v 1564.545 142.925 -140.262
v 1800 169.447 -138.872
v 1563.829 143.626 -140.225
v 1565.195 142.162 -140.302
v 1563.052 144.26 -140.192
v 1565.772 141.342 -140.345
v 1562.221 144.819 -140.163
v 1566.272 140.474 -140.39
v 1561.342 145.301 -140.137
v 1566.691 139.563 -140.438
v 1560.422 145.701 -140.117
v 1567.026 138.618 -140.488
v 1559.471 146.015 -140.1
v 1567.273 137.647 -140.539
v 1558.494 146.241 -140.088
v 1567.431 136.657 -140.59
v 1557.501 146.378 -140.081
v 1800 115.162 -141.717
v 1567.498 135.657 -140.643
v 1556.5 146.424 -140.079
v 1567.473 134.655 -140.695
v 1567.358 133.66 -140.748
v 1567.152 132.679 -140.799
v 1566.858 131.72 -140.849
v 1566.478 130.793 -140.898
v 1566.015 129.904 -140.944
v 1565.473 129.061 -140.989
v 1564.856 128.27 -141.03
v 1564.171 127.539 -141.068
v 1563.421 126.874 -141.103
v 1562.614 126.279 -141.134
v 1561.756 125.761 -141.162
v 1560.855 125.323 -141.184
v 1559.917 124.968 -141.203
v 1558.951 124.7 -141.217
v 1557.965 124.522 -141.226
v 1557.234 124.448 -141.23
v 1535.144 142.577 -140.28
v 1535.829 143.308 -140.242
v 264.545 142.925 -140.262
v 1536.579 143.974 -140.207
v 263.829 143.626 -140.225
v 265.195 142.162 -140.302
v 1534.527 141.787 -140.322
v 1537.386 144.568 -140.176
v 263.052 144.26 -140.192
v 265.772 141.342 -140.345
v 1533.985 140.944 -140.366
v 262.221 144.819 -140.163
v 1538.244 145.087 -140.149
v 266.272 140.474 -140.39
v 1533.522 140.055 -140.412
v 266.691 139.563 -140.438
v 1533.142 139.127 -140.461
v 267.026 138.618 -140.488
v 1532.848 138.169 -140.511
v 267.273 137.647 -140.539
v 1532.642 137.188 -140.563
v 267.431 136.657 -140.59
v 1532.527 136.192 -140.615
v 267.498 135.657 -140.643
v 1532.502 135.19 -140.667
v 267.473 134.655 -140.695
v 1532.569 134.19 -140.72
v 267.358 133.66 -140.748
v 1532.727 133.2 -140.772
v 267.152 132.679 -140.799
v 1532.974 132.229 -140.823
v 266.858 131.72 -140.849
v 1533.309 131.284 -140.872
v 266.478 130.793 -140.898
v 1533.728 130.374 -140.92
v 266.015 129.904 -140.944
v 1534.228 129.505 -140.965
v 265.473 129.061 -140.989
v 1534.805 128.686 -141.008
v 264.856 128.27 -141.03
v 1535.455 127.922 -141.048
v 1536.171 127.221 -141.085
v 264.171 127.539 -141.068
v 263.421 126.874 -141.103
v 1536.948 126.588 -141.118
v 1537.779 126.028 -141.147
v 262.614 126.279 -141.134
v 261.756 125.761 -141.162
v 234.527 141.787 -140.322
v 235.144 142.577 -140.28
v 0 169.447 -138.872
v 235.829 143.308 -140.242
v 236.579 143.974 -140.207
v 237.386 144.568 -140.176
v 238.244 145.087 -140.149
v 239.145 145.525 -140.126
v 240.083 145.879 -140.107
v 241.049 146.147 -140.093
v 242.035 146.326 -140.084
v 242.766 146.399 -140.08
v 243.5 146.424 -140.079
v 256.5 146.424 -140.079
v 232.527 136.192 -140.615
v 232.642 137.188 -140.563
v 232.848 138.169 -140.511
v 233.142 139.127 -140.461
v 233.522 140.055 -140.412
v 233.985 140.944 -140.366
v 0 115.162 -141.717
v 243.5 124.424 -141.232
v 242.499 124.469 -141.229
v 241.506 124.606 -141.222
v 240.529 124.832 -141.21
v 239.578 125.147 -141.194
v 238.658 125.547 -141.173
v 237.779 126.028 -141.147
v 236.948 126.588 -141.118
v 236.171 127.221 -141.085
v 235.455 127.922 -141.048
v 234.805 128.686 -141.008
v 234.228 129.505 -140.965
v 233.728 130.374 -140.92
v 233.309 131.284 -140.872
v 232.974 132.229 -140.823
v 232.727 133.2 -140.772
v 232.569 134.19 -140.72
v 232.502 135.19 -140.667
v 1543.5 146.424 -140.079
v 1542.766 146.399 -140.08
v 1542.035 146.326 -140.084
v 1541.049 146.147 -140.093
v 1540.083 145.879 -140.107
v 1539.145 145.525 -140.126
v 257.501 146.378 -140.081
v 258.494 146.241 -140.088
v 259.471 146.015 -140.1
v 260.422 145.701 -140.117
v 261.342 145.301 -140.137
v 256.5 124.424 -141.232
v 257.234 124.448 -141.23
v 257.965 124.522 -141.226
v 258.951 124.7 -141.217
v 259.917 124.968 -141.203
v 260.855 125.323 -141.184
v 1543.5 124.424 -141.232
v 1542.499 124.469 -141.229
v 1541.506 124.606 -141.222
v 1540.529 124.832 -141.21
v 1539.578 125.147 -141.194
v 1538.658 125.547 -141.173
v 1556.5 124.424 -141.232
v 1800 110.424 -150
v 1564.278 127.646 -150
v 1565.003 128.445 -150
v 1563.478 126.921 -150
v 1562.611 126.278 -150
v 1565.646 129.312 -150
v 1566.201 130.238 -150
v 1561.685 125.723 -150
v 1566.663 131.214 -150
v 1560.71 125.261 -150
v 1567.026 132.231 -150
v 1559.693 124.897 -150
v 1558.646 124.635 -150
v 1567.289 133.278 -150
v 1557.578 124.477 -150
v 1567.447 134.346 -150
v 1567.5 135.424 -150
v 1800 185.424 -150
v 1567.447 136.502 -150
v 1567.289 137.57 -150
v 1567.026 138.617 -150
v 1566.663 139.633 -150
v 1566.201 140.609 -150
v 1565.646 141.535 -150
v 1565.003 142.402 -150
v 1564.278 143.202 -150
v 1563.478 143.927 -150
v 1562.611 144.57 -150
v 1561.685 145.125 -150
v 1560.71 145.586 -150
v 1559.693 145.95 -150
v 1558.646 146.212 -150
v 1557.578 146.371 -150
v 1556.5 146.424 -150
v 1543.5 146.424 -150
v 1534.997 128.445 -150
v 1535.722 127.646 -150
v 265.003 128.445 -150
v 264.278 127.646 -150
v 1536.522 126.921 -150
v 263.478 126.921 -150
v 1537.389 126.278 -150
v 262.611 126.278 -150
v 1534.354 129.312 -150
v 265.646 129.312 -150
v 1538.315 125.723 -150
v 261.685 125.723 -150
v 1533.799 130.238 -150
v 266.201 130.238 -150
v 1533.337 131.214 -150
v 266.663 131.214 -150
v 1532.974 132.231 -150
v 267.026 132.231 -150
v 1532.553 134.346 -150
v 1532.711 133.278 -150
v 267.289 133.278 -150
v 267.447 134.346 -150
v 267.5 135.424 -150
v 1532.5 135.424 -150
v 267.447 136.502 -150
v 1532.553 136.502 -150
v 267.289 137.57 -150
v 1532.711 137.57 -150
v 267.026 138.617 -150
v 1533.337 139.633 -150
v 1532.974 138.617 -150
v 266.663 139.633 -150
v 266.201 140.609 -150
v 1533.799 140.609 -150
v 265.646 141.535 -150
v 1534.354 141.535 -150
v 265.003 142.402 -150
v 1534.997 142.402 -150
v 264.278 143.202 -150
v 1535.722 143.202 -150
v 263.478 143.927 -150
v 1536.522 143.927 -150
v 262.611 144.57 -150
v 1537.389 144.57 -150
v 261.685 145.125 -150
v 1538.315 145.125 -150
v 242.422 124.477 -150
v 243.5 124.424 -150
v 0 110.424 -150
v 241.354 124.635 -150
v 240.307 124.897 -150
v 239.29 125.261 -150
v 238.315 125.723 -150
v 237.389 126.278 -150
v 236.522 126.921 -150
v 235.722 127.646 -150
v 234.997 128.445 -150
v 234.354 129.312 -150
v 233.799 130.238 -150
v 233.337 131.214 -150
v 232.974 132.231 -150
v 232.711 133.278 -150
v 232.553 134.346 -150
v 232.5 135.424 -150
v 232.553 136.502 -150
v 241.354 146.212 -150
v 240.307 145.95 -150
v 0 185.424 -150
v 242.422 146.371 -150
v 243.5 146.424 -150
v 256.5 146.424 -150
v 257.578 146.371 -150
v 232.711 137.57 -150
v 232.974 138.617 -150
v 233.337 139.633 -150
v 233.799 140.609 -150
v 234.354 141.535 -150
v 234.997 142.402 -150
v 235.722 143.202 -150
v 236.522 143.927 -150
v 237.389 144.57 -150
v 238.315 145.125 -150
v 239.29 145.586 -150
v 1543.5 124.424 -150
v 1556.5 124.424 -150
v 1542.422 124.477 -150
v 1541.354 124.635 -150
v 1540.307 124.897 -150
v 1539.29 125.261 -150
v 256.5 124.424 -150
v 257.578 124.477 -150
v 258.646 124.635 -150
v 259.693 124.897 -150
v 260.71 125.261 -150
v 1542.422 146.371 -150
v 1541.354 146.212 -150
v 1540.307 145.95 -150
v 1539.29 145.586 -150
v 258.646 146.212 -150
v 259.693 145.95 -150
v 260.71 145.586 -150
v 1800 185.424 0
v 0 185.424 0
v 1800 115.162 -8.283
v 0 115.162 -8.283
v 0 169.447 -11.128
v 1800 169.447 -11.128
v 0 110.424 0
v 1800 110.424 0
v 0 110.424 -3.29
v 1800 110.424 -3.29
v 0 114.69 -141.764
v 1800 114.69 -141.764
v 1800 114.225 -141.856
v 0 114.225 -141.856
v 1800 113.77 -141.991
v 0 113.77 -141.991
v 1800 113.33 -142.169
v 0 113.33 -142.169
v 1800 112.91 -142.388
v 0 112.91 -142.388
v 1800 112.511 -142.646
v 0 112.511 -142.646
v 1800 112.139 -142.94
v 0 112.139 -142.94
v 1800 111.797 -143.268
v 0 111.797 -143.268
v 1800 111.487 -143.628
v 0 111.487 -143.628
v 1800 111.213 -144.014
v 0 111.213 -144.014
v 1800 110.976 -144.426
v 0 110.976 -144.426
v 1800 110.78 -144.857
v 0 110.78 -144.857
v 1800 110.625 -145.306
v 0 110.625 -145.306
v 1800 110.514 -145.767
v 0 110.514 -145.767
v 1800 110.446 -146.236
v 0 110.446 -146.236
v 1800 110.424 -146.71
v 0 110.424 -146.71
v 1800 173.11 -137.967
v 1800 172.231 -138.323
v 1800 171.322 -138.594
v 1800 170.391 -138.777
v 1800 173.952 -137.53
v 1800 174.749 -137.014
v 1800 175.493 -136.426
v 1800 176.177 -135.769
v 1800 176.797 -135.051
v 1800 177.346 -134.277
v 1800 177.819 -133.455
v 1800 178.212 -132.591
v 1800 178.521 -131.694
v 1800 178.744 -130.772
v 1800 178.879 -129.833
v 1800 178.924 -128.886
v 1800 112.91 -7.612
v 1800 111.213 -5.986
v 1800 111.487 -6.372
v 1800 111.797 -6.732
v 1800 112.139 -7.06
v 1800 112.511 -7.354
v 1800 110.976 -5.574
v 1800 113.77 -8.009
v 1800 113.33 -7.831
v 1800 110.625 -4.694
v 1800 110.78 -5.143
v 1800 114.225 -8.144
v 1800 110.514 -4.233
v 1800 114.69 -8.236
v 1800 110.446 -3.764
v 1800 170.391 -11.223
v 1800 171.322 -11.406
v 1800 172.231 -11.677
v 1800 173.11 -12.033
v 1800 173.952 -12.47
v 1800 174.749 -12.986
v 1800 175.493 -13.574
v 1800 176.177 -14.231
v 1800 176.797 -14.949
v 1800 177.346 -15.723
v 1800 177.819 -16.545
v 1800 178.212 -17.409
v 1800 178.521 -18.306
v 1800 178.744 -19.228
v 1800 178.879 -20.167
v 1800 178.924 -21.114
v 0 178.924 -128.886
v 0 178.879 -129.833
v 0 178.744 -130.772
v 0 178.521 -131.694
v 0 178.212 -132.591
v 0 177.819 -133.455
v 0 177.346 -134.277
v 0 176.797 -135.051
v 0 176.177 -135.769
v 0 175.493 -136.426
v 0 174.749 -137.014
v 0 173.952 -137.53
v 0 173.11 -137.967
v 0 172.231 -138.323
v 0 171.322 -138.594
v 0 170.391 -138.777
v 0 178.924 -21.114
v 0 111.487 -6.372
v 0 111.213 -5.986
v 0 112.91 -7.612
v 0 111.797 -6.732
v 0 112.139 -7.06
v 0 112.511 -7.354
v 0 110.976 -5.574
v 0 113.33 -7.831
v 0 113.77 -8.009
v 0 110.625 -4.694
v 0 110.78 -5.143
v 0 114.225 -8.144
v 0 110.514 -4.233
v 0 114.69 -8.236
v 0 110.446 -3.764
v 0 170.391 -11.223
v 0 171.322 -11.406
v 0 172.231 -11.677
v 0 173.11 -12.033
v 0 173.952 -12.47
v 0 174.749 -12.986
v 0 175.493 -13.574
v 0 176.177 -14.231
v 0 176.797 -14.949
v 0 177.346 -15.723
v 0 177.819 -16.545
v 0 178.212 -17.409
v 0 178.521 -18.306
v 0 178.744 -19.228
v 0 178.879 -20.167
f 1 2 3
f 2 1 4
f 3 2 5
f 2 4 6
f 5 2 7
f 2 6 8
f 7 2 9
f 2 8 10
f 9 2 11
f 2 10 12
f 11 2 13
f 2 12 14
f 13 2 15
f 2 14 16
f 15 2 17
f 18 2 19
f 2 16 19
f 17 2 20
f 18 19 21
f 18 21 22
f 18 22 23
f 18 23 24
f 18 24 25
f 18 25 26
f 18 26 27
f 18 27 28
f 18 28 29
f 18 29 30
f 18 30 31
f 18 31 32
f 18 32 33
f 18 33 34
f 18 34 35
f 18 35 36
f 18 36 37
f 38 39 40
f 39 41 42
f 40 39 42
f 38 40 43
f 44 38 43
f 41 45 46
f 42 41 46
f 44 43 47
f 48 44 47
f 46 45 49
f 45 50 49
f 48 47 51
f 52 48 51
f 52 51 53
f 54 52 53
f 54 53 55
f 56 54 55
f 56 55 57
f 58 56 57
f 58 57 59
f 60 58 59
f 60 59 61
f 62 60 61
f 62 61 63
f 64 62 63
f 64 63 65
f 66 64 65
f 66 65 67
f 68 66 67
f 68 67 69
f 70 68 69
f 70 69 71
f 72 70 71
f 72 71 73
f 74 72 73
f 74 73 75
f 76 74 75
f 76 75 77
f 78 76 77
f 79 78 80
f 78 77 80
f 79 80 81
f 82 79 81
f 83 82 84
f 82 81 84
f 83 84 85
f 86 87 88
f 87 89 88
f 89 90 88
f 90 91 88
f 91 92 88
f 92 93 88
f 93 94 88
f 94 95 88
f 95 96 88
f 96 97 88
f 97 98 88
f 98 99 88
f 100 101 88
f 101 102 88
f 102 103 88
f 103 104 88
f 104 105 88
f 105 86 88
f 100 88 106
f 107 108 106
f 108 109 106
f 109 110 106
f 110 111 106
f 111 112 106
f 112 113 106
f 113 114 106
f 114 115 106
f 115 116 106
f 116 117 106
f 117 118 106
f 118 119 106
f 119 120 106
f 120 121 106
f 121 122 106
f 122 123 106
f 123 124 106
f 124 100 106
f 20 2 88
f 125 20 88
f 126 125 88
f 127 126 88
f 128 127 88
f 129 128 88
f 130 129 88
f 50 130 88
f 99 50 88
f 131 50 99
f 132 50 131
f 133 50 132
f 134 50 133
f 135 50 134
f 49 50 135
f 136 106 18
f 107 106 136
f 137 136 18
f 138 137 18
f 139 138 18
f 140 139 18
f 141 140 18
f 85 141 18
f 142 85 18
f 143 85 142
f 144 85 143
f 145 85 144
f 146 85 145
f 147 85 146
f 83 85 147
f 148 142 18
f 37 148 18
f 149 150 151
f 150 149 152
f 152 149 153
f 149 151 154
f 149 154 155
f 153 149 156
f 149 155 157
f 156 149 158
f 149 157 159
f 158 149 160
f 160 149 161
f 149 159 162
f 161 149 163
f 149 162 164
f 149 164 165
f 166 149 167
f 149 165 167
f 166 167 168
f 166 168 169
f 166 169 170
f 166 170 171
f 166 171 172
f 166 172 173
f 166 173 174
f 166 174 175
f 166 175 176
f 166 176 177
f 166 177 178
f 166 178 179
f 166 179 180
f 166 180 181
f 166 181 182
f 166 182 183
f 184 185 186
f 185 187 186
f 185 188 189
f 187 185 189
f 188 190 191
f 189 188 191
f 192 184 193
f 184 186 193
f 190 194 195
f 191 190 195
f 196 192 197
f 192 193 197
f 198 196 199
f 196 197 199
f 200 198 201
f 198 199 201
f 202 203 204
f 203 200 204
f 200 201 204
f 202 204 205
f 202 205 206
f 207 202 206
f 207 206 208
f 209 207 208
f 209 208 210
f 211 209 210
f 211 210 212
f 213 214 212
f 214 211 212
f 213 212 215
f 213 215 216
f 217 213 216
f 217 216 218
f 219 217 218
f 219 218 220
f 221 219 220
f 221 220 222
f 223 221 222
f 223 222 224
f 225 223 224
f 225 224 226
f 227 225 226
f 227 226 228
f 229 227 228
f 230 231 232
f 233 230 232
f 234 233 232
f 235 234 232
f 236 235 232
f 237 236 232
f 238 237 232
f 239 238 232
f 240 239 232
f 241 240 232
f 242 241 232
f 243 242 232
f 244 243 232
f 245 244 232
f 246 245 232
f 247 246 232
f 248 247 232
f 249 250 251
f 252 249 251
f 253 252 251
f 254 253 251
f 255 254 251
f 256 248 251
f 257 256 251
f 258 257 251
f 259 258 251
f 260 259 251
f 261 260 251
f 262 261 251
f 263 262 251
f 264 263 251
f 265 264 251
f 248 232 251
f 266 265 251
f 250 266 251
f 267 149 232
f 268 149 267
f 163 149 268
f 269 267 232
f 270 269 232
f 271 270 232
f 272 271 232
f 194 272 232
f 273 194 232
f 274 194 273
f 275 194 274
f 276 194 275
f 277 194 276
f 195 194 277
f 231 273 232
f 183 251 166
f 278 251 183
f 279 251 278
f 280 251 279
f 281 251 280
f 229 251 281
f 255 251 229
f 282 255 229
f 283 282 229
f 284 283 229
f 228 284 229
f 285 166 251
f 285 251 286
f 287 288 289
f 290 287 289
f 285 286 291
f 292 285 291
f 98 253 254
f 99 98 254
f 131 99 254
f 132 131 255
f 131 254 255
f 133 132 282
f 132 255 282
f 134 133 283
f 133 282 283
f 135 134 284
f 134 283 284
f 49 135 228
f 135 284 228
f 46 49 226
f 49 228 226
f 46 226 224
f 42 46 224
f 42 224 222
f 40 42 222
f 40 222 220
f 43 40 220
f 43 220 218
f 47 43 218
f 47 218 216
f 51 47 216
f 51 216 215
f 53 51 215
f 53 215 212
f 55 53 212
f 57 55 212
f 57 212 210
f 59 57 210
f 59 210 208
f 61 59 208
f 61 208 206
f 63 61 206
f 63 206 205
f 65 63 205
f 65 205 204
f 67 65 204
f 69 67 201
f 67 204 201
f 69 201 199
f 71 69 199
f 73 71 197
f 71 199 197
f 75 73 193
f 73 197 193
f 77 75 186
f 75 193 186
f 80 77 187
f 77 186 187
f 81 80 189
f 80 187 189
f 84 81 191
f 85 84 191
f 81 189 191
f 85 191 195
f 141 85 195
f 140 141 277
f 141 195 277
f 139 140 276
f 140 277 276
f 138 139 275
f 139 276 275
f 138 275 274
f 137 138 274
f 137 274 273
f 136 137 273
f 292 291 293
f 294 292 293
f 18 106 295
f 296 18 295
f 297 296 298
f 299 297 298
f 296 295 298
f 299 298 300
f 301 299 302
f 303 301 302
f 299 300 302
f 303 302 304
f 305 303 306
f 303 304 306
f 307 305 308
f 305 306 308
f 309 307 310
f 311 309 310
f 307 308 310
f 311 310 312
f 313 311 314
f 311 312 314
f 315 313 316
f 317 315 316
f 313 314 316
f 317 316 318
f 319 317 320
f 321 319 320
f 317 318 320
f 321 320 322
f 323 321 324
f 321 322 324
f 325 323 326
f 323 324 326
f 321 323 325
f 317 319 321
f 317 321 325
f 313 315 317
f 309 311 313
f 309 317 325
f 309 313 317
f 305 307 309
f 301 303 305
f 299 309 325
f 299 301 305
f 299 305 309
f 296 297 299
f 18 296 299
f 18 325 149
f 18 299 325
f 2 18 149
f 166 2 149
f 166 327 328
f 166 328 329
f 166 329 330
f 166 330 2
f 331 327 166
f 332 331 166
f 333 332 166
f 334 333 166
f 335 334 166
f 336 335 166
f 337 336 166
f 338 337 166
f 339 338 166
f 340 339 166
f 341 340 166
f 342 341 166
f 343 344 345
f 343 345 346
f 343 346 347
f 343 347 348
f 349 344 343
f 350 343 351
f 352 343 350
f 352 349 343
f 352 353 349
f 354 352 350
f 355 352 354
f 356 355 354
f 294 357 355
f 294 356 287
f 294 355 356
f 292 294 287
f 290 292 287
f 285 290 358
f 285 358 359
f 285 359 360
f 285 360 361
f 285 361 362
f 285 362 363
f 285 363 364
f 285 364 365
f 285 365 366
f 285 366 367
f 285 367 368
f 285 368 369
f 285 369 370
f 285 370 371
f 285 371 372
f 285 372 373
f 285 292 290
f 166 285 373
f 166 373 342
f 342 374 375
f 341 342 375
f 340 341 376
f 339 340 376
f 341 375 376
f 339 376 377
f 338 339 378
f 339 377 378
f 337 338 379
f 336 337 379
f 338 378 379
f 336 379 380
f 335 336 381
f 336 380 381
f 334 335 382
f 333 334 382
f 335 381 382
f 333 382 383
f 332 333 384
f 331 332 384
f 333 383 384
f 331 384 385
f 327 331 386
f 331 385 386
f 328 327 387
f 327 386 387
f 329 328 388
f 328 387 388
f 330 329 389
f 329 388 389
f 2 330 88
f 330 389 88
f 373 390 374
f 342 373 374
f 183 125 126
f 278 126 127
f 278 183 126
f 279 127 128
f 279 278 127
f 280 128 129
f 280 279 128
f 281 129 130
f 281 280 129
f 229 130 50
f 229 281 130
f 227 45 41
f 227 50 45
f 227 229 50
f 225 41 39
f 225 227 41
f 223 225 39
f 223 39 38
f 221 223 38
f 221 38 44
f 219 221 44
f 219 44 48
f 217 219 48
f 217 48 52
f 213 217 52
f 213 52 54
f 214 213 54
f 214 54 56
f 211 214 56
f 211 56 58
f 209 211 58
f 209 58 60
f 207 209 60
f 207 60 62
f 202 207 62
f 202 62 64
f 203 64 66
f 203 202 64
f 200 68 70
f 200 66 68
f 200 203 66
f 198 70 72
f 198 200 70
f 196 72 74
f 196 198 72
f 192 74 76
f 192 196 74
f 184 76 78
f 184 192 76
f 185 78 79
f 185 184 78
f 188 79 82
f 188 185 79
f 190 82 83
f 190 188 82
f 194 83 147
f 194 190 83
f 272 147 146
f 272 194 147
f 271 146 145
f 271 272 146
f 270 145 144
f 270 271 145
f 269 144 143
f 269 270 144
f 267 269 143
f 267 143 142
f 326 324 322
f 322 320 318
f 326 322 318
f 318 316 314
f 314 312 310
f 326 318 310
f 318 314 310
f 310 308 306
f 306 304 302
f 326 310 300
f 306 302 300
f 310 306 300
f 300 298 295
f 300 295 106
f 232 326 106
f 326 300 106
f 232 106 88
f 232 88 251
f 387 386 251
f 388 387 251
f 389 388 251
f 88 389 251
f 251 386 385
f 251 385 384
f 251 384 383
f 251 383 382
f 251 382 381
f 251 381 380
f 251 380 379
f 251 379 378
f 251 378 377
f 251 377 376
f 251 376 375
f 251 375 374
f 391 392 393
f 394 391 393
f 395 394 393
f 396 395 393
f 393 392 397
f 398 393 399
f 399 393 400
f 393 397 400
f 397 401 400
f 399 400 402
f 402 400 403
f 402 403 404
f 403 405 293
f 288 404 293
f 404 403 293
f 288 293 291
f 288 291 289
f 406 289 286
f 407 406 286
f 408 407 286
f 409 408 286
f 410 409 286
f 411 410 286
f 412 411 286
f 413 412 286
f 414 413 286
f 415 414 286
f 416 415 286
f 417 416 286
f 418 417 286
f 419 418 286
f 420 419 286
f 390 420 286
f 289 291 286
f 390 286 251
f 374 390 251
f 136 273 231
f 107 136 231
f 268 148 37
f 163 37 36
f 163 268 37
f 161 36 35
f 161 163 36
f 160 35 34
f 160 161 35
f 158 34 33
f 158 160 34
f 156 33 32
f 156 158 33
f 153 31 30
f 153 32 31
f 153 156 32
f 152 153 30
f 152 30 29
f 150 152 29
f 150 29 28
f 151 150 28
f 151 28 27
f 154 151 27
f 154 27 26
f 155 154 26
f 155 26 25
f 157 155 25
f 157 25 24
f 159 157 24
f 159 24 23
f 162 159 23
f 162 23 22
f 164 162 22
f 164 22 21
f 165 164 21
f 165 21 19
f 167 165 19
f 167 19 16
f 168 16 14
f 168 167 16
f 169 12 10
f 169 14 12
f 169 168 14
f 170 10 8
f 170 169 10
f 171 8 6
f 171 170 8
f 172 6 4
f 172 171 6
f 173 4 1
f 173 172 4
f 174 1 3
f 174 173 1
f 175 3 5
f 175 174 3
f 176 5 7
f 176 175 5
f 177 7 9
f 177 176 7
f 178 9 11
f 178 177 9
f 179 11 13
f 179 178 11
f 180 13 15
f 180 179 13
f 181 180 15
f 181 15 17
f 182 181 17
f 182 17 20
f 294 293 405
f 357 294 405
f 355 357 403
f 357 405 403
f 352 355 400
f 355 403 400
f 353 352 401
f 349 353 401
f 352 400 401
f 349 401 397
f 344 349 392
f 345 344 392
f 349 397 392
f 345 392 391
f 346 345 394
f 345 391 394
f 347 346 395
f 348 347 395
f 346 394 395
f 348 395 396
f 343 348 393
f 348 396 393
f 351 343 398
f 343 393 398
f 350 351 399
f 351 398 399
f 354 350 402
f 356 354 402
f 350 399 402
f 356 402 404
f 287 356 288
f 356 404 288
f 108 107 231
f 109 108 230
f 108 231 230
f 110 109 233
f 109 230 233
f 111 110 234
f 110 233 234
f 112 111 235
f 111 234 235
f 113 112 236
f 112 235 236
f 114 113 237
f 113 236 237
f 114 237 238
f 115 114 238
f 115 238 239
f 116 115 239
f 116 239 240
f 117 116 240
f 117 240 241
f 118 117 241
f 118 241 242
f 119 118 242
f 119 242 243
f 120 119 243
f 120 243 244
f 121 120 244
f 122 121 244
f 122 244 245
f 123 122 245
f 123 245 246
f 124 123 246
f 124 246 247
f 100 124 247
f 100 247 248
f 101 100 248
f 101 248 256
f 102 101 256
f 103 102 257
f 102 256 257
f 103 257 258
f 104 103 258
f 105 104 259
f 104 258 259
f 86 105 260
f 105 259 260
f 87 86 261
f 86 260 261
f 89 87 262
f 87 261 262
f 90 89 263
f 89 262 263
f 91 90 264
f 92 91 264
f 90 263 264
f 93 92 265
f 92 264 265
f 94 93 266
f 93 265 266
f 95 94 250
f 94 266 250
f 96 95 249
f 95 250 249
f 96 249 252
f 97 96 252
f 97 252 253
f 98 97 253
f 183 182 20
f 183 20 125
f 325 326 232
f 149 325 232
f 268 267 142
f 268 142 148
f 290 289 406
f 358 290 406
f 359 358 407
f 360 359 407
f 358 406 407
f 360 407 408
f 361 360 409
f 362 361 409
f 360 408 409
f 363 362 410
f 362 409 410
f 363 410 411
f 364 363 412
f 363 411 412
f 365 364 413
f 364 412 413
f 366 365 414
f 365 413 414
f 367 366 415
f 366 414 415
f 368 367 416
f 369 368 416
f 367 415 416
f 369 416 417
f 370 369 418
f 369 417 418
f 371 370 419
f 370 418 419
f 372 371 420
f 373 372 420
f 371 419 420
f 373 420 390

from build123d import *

# Parameters (mm, degrees)
F1_DEPTH = 1800
F3_DEPTH = 9.9223883311


# Not quite as in the source:
# - a pattern or mirror of a feature is missing from the dataset's text; its kind, count and spacing are read off the source's solid


with BuildPart() as f1:
    # F0 (on Right) → F1 (new body)
    with BuildSketch(Plane.YZ):
        with BuildLine():
            Line((185.4237287785, 0), (110.4237287785, 0))
            Line((110.4237287785, 0), (110.4237287785, -3.2898854433))
            ThreePointArc((110.4237287785, -3.2898854433), (111.7968569235, -6.7316583218), (115.1620489973, -8.2830331171))
            Line((115.1620489973, -8.2830331171), (169.447088341, -11.1279914774))
            ThreePointArc((169.447088341, -11.1279914774), (176.1774724886, -14.230741068), (178.9237287785, -21.1142868249))
            Line((178.9237287785, -21.1142868249), (178.9237287785, -128.8857131751))
            ThreePointArc((178.9237287785, -128.8857131751), (176.1774724886, -135.769258932), (169.447088341, -138.8720085226))
            Line((169.447088341, -138.8720085226), (115.1620489973, -141.7169668829))
            ThreePointArc((115.1620489973, -141.7169668829), (111.7968569235, -143.2683416782), (110.4237287785, -146.7101145567))
            Line((110.4237287785, -146.7101145567), (110.4237287785, -150))
            Line((110.4237287785, -150), (185.4237287785, -150))
            Line((185.4237287785, -150), (185.4237287785, 0))
        make_face()
    extrude(amount=F1_DEPTH)

    # F2 (on face) → F3 (cut, through all)
    with BuildSketch(Plane(origin=(0, 0, -150), x_dir=(1, 0, 0), z_dir=(0, 0, -1))):
        with BuildLine():
            ThreePointArc((243.5, -124.4237287785), (232.5, -135.4237287785), (243.5, -146.4237287785))
            Line((243.5, -146.4237287785), (256.5, -146.4237287785))
            ThreePointArc((256.5, -146.4237287785), (267.5, -135.4237287785), (256.5, -124.4237287785))
            Line((256.5, -124.4237287785), (243.5, -124.4237287785))
        make_face()
    f3 = extrude(amount=-F3_DEPTH, mode=Mode.SUBTRACT)

    # F3_copies: F3 across plane
    add(f3.mirror(Plane(origin=(900, 0, 0), x_dir=(0, 0, 1), z_dir=(1, 0, 0))), mode=Mode.SUBTRACT)


solid = f1.part
